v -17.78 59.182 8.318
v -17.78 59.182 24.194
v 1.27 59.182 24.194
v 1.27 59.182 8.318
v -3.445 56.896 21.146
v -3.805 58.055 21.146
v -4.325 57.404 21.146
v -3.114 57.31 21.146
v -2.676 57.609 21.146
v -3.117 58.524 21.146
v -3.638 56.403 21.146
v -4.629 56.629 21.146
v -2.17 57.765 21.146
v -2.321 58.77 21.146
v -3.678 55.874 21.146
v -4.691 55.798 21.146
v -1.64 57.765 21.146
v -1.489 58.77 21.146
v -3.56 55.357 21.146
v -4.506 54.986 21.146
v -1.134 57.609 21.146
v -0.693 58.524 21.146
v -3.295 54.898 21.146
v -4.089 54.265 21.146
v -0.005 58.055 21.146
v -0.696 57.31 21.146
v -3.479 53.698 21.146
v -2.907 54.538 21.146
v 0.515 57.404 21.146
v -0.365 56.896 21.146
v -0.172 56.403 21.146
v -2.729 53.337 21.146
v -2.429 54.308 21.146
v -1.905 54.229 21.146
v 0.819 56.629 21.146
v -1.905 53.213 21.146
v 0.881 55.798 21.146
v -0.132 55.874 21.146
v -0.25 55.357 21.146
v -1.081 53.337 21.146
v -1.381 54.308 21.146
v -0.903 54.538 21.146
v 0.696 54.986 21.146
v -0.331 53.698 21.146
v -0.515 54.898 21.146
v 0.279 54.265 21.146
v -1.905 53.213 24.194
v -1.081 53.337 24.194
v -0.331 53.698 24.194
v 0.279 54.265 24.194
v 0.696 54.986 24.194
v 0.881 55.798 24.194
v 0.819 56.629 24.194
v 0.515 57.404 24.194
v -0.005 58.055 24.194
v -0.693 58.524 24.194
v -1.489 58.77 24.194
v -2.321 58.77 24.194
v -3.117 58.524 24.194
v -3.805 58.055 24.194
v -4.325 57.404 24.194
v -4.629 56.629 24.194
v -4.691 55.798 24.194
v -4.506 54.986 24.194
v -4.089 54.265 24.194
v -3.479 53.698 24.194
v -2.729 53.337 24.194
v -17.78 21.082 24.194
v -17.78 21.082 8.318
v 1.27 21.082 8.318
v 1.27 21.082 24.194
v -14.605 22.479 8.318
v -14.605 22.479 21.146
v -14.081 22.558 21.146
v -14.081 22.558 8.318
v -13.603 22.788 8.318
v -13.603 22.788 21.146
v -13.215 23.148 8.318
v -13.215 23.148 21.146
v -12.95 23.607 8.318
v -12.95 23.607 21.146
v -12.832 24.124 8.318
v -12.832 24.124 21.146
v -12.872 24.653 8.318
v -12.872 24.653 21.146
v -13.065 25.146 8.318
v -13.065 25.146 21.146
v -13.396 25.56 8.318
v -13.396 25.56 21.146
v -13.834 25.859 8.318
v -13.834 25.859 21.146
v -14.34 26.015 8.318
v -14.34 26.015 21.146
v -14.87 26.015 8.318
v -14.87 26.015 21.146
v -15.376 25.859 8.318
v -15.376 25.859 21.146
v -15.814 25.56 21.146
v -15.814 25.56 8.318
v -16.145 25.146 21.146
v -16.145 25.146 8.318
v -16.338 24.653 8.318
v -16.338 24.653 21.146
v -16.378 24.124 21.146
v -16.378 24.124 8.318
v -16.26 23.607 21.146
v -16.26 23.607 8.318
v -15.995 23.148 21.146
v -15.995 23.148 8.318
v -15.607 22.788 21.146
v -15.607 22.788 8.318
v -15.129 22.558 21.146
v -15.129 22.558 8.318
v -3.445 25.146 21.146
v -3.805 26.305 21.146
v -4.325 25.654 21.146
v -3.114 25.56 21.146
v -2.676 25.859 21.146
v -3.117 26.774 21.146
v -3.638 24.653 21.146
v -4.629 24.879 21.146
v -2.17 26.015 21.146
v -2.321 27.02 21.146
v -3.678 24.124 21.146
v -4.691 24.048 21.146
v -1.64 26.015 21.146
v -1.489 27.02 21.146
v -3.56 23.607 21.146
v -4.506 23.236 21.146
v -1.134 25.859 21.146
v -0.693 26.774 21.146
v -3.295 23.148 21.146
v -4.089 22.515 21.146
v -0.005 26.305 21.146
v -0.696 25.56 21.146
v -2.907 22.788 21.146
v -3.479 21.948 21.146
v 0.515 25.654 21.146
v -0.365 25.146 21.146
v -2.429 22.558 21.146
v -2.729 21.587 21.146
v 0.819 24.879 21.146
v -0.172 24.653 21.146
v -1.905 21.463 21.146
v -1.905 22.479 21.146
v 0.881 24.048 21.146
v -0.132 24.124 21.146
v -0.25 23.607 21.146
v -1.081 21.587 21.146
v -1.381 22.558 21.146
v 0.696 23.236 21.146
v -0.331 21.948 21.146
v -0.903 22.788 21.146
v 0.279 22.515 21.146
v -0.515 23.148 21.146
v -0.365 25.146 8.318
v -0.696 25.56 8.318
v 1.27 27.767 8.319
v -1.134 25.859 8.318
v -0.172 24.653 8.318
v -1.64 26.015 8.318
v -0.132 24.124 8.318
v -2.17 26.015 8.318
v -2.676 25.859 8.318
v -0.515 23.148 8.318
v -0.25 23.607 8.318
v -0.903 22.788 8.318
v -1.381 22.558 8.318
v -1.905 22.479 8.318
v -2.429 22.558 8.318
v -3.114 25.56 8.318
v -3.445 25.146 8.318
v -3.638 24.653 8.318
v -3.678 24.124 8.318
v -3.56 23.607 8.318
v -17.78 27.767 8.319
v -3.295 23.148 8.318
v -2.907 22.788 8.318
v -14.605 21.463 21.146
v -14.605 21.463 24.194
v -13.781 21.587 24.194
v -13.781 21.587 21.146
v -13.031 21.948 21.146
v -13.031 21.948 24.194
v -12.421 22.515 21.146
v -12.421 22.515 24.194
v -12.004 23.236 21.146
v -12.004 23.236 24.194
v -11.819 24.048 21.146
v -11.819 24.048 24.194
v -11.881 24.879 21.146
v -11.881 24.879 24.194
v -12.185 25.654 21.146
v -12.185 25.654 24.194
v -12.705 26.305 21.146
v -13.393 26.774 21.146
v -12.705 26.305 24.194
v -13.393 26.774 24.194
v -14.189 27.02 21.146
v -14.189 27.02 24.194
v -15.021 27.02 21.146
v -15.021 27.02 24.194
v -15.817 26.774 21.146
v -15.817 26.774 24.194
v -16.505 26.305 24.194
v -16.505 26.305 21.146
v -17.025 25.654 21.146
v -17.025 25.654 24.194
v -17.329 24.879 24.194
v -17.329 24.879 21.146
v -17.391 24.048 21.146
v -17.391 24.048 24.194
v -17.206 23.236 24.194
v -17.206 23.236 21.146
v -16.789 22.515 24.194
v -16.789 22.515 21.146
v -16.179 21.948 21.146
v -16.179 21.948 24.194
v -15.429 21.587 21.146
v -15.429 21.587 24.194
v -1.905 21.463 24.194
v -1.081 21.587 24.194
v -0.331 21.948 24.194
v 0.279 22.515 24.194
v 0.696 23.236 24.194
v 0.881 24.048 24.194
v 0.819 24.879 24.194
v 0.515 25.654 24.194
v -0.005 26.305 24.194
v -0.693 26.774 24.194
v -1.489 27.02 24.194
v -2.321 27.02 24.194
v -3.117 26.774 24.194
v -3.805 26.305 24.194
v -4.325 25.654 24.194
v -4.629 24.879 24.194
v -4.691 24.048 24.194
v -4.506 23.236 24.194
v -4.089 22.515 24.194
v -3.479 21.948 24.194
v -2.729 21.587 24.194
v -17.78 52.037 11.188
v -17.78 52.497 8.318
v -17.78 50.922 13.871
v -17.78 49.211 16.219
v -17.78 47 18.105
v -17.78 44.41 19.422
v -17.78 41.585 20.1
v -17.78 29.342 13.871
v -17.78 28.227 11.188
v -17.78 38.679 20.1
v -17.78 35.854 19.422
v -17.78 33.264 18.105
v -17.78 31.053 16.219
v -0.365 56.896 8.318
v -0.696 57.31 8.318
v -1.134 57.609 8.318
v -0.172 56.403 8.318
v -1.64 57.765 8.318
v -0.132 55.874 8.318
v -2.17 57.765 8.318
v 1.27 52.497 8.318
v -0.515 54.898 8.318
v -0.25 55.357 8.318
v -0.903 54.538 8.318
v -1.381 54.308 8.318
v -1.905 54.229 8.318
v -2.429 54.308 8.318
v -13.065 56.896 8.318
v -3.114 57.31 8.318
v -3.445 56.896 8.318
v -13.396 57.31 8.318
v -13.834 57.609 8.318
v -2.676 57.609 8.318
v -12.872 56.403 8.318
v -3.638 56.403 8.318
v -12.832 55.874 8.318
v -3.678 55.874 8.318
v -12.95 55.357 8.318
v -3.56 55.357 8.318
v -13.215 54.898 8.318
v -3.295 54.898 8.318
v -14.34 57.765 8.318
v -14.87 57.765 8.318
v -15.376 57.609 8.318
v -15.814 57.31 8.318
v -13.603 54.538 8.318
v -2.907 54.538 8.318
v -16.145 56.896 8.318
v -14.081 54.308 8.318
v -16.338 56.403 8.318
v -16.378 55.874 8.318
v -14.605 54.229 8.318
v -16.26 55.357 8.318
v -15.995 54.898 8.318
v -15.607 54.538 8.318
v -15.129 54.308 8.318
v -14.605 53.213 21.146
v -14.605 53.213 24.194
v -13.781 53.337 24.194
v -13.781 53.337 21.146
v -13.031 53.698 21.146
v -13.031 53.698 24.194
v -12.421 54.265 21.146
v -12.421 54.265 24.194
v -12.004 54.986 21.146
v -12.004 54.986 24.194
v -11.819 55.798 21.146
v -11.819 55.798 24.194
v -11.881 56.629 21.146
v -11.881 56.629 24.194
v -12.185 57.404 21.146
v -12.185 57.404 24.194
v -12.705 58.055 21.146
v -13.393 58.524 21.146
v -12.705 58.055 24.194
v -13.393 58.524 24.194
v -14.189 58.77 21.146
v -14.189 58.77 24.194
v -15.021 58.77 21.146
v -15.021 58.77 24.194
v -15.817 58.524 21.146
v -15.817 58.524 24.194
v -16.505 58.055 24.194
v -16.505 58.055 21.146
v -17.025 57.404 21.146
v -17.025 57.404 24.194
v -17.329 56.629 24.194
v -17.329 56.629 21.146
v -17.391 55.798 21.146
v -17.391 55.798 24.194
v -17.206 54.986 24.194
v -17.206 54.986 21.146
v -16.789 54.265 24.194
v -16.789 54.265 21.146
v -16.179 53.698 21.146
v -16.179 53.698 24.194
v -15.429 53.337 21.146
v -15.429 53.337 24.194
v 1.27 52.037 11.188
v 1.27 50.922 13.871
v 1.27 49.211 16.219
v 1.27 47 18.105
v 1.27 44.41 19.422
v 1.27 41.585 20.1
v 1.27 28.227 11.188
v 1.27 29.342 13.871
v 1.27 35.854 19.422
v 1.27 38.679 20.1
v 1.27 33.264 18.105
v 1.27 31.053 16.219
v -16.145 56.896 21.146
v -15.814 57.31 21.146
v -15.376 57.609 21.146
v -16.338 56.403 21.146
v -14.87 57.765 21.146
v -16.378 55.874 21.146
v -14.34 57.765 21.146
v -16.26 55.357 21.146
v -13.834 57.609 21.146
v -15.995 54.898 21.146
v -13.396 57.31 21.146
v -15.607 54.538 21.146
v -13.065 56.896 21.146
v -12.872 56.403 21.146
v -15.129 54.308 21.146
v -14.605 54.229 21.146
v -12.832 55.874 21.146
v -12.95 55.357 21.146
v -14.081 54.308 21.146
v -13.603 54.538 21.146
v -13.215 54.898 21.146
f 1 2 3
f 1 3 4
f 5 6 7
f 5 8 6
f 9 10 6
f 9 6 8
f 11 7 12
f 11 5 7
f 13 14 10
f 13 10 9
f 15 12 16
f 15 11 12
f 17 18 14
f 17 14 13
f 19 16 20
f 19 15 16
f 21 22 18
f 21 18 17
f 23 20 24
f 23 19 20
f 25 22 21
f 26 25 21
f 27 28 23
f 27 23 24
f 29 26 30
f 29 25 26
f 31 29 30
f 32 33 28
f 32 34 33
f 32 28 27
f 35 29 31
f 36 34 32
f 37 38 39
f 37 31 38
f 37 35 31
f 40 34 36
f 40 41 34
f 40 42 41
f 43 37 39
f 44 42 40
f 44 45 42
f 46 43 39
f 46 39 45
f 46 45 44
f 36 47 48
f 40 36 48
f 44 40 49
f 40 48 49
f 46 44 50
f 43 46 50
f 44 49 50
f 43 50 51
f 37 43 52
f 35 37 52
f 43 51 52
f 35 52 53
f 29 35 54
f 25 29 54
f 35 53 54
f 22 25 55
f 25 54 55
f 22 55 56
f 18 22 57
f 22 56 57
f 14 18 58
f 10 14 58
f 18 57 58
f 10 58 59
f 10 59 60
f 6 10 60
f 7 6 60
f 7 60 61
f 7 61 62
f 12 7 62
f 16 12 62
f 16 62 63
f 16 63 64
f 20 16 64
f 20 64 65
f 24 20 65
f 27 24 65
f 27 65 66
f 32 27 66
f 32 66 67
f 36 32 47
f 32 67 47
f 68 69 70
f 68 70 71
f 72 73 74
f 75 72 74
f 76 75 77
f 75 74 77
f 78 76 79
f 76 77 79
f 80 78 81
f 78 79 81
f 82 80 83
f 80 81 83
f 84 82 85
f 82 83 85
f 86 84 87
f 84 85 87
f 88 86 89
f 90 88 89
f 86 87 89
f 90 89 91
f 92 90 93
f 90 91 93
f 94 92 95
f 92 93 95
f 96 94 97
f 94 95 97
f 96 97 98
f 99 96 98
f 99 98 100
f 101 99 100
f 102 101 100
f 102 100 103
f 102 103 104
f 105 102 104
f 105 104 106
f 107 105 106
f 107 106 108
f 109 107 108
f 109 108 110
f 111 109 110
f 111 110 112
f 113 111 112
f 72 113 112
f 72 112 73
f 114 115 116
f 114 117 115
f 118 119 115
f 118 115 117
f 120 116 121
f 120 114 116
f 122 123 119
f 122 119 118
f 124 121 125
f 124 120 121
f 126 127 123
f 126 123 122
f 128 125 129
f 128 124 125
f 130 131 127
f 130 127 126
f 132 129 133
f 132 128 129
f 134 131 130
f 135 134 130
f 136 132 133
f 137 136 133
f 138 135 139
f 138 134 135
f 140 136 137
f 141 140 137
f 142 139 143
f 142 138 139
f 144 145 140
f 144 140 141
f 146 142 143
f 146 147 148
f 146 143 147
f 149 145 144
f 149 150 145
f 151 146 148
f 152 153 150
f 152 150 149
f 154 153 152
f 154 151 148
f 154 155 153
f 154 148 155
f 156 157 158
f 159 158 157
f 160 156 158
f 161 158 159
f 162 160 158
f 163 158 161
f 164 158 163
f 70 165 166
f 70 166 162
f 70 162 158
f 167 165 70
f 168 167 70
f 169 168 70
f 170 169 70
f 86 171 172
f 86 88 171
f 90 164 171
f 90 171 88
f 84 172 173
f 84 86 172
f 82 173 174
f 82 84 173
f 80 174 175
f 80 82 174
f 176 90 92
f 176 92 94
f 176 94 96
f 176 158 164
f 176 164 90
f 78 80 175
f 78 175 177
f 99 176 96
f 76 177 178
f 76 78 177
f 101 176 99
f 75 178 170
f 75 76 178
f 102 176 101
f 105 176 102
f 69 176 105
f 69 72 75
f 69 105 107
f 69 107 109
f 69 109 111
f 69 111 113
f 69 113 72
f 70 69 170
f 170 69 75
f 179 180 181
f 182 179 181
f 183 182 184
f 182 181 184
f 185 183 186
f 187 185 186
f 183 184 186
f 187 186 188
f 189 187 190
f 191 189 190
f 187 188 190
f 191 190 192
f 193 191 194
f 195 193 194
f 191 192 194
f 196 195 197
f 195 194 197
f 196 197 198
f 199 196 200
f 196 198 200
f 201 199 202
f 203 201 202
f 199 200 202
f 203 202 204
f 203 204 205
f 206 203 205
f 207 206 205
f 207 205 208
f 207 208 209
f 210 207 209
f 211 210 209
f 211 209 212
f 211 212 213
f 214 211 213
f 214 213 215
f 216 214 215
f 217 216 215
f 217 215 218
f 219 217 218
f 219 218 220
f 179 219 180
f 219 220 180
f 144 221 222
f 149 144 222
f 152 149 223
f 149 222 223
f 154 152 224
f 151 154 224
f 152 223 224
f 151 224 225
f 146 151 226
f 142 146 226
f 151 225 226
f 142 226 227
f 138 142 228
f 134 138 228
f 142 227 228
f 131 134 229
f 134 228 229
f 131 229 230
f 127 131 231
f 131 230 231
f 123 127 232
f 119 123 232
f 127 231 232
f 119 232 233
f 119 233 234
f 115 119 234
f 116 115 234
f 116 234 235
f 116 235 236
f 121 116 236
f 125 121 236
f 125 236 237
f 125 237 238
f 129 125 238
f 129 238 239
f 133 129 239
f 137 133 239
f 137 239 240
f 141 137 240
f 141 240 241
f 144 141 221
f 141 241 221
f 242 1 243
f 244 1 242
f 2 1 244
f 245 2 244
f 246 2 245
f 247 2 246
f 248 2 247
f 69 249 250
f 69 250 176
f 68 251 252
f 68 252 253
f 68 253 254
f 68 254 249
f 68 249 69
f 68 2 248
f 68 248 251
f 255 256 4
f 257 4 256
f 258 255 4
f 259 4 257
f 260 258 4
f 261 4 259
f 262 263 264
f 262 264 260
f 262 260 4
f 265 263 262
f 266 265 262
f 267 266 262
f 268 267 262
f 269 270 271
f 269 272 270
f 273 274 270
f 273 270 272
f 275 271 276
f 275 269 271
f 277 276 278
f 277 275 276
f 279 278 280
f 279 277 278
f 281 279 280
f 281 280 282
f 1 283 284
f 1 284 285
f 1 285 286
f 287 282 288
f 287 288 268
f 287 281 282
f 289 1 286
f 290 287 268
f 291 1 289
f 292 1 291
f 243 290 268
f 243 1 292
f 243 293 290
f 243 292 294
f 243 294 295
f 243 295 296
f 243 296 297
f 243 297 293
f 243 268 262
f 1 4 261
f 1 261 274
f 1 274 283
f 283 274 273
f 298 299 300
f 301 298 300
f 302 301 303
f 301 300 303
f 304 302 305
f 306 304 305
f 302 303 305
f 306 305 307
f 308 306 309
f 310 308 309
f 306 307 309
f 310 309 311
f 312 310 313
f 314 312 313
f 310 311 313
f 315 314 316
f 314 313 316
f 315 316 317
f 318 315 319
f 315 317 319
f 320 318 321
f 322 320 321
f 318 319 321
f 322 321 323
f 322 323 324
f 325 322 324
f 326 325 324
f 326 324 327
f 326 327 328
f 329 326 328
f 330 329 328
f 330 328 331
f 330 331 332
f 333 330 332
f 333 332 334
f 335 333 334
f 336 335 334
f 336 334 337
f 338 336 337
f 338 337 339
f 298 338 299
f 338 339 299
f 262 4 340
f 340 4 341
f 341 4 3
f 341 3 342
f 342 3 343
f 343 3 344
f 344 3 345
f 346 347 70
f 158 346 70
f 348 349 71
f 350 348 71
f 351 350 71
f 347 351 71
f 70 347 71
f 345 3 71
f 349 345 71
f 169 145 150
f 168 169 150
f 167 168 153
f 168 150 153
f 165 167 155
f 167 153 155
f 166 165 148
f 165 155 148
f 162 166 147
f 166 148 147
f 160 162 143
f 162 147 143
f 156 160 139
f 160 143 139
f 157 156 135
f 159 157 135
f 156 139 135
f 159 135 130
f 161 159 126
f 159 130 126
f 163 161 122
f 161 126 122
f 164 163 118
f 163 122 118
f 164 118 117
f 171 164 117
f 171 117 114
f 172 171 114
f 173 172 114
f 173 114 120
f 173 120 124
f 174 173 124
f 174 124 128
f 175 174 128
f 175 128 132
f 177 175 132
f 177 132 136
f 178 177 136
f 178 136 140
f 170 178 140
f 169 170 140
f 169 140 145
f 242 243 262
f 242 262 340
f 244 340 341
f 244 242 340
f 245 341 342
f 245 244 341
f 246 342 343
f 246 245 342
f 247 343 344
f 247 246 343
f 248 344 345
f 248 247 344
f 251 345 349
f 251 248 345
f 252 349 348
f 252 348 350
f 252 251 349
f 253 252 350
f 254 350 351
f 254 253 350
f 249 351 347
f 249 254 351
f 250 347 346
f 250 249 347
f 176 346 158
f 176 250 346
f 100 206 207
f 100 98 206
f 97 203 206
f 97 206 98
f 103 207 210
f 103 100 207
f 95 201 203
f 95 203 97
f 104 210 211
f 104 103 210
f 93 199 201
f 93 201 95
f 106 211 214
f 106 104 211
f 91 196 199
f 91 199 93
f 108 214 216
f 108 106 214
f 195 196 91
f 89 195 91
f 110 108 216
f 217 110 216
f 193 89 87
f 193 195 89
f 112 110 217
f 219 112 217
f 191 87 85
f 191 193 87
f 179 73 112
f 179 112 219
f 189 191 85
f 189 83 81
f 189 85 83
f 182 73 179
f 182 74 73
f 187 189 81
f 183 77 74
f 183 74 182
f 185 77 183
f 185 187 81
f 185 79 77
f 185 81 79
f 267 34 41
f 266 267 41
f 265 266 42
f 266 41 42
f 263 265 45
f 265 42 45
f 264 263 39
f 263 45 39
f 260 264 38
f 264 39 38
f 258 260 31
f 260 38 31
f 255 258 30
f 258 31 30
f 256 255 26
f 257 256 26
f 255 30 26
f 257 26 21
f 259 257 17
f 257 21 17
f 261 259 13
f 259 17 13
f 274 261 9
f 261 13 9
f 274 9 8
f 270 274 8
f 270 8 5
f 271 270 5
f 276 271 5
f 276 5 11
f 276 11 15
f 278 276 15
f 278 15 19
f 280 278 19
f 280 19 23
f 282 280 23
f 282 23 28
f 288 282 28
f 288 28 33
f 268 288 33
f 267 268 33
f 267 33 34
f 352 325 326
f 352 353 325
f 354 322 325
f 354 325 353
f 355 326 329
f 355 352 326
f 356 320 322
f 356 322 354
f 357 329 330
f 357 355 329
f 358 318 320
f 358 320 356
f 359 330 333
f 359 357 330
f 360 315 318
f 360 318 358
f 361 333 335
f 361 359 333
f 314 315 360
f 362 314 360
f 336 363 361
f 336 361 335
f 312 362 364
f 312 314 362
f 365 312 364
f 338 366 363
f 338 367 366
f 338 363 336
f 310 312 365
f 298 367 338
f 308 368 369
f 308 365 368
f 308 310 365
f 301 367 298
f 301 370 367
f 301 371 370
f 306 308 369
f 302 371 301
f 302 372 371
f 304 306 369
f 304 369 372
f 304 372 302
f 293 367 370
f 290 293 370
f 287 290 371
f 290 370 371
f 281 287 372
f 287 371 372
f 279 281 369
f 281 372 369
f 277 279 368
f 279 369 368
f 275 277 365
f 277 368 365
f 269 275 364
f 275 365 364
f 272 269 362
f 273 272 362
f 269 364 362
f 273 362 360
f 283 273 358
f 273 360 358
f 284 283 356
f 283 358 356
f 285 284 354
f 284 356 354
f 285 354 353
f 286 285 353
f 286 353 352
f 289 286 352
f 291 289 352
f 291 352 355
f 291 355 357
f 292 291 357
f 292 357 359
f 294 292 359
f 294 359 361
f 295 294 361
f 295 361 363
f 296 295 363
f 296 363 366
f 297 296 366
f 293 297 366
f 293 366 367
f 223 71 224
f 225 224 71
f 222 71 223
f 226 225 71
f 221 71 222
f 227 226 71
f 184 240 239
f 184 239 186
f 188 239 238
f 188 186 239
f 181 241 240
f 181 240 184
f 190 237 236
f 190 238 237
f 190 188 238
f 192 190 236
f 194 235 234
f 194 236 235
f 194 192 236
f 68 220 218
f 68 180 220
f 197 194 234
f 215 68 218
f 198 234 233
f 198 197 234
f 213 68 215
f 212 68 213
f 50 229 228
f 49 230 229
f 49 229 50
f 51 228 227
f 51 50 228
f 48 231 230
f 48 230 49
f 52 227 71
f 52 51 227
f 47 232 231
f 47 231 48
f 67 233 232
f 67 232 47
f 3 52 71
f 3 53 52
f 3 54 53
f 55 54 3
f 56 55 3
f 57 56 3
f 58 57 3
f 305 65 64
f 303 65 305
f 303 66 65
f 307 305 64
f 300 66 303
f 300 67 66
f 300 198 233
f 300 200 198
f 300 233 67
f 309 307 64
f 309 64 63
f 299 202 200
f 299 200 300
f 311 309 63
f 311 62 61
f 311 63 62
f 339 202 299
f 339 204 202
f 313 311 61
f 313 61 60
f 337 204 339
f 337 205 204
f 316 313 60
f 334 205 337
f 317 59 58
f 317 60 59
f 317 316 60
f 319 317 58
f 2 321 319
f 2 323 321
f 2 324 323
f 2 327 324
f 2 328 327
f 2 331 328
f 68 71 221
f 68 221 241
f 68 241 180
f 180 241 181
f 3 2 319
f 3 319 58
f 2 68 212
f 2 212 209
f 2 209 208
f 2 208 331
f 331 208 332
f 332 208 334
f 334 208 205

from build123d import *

# Parameters (mm, degrees)
PAD034_DEPTH    = 19.05
SKETCH070_R     = 1.778
POCKET004_DEPTH = 15.876
SKETCH071_R     = 2.794
POCKET005_DEPTH = 3.048


with BuildPart() as part:
    # Sketch069 → Pad034 (new body)
    with BuildSketch(Plane.YZ):
        with BuildLine():
            Line((-19.05, -7.9375), (-19.05, 7.9375))
            Line((-19.05, 7.9375), (19.05, 7.9375))
            Line((19.05, 7.9375), (19.05, -7.9375))
            Line((19.05, -7.9375), (12.364569, -7.9375))
            ThreePointArc((12.364569, -7.9375), (0, 3.9295), (-12.364569, -7.9375))
            Line((-12.364569, -7.9375), (-19.05, -7.9375))
        make_face()
    extrude(amount=PAD034_DEPTH)

    # Sketch070 (on Face2 of Pad034) → Pocket004 (cut, through all)
    with BuildSketch(Plane(origin=(0, 0, 7.9375), x_dir=(0, -1, 0), z_dir=(0, 0, 1))):
        with Locations((15.875, 15.875)):
            Circle(SKETCH070_R)
        with Locations((15.875, 3.175)):
            Circle(SKETCH070_R)
        with Locations((-15.875, 15.875)):
            Circle(SKETCH070_R)
        with Locations((-15.875, 3.175)):
            Circle(SKETCH070_R)
    extrude(amount=-POCKET004_DEPTH, mode=Mode.SUBTRACT)

    # Sketch071 (on Face2 of Pad034) → Pocket005 (cut)
    with BuildSketch(Plane(origin=(0, 0, 7.9375), x_dir=(0, -1, 0), z_dir=(0, 0, 1))):
        with Locations((15.875, 15.875)):
            Circle(SKETCH071_R)
        with Locations((15.875, 3.175)):
            Circle(SKETCH071_R)
        with Locations((-15.875, 15.875)):
            Circle(SKETCH071_R)
        with Locations((-15.875, 3.175)):
            Circle(SKETCH071_R)
    extrude(amount=-POCKET005_DEPTH, mode=Mode.SUBTRACT)


with BuildPart() as part_1:
    # Body027 placement: moved
    add(part.part.moved(Location((-17.78, 40.132, 16.256))))


solid = part_1.part
